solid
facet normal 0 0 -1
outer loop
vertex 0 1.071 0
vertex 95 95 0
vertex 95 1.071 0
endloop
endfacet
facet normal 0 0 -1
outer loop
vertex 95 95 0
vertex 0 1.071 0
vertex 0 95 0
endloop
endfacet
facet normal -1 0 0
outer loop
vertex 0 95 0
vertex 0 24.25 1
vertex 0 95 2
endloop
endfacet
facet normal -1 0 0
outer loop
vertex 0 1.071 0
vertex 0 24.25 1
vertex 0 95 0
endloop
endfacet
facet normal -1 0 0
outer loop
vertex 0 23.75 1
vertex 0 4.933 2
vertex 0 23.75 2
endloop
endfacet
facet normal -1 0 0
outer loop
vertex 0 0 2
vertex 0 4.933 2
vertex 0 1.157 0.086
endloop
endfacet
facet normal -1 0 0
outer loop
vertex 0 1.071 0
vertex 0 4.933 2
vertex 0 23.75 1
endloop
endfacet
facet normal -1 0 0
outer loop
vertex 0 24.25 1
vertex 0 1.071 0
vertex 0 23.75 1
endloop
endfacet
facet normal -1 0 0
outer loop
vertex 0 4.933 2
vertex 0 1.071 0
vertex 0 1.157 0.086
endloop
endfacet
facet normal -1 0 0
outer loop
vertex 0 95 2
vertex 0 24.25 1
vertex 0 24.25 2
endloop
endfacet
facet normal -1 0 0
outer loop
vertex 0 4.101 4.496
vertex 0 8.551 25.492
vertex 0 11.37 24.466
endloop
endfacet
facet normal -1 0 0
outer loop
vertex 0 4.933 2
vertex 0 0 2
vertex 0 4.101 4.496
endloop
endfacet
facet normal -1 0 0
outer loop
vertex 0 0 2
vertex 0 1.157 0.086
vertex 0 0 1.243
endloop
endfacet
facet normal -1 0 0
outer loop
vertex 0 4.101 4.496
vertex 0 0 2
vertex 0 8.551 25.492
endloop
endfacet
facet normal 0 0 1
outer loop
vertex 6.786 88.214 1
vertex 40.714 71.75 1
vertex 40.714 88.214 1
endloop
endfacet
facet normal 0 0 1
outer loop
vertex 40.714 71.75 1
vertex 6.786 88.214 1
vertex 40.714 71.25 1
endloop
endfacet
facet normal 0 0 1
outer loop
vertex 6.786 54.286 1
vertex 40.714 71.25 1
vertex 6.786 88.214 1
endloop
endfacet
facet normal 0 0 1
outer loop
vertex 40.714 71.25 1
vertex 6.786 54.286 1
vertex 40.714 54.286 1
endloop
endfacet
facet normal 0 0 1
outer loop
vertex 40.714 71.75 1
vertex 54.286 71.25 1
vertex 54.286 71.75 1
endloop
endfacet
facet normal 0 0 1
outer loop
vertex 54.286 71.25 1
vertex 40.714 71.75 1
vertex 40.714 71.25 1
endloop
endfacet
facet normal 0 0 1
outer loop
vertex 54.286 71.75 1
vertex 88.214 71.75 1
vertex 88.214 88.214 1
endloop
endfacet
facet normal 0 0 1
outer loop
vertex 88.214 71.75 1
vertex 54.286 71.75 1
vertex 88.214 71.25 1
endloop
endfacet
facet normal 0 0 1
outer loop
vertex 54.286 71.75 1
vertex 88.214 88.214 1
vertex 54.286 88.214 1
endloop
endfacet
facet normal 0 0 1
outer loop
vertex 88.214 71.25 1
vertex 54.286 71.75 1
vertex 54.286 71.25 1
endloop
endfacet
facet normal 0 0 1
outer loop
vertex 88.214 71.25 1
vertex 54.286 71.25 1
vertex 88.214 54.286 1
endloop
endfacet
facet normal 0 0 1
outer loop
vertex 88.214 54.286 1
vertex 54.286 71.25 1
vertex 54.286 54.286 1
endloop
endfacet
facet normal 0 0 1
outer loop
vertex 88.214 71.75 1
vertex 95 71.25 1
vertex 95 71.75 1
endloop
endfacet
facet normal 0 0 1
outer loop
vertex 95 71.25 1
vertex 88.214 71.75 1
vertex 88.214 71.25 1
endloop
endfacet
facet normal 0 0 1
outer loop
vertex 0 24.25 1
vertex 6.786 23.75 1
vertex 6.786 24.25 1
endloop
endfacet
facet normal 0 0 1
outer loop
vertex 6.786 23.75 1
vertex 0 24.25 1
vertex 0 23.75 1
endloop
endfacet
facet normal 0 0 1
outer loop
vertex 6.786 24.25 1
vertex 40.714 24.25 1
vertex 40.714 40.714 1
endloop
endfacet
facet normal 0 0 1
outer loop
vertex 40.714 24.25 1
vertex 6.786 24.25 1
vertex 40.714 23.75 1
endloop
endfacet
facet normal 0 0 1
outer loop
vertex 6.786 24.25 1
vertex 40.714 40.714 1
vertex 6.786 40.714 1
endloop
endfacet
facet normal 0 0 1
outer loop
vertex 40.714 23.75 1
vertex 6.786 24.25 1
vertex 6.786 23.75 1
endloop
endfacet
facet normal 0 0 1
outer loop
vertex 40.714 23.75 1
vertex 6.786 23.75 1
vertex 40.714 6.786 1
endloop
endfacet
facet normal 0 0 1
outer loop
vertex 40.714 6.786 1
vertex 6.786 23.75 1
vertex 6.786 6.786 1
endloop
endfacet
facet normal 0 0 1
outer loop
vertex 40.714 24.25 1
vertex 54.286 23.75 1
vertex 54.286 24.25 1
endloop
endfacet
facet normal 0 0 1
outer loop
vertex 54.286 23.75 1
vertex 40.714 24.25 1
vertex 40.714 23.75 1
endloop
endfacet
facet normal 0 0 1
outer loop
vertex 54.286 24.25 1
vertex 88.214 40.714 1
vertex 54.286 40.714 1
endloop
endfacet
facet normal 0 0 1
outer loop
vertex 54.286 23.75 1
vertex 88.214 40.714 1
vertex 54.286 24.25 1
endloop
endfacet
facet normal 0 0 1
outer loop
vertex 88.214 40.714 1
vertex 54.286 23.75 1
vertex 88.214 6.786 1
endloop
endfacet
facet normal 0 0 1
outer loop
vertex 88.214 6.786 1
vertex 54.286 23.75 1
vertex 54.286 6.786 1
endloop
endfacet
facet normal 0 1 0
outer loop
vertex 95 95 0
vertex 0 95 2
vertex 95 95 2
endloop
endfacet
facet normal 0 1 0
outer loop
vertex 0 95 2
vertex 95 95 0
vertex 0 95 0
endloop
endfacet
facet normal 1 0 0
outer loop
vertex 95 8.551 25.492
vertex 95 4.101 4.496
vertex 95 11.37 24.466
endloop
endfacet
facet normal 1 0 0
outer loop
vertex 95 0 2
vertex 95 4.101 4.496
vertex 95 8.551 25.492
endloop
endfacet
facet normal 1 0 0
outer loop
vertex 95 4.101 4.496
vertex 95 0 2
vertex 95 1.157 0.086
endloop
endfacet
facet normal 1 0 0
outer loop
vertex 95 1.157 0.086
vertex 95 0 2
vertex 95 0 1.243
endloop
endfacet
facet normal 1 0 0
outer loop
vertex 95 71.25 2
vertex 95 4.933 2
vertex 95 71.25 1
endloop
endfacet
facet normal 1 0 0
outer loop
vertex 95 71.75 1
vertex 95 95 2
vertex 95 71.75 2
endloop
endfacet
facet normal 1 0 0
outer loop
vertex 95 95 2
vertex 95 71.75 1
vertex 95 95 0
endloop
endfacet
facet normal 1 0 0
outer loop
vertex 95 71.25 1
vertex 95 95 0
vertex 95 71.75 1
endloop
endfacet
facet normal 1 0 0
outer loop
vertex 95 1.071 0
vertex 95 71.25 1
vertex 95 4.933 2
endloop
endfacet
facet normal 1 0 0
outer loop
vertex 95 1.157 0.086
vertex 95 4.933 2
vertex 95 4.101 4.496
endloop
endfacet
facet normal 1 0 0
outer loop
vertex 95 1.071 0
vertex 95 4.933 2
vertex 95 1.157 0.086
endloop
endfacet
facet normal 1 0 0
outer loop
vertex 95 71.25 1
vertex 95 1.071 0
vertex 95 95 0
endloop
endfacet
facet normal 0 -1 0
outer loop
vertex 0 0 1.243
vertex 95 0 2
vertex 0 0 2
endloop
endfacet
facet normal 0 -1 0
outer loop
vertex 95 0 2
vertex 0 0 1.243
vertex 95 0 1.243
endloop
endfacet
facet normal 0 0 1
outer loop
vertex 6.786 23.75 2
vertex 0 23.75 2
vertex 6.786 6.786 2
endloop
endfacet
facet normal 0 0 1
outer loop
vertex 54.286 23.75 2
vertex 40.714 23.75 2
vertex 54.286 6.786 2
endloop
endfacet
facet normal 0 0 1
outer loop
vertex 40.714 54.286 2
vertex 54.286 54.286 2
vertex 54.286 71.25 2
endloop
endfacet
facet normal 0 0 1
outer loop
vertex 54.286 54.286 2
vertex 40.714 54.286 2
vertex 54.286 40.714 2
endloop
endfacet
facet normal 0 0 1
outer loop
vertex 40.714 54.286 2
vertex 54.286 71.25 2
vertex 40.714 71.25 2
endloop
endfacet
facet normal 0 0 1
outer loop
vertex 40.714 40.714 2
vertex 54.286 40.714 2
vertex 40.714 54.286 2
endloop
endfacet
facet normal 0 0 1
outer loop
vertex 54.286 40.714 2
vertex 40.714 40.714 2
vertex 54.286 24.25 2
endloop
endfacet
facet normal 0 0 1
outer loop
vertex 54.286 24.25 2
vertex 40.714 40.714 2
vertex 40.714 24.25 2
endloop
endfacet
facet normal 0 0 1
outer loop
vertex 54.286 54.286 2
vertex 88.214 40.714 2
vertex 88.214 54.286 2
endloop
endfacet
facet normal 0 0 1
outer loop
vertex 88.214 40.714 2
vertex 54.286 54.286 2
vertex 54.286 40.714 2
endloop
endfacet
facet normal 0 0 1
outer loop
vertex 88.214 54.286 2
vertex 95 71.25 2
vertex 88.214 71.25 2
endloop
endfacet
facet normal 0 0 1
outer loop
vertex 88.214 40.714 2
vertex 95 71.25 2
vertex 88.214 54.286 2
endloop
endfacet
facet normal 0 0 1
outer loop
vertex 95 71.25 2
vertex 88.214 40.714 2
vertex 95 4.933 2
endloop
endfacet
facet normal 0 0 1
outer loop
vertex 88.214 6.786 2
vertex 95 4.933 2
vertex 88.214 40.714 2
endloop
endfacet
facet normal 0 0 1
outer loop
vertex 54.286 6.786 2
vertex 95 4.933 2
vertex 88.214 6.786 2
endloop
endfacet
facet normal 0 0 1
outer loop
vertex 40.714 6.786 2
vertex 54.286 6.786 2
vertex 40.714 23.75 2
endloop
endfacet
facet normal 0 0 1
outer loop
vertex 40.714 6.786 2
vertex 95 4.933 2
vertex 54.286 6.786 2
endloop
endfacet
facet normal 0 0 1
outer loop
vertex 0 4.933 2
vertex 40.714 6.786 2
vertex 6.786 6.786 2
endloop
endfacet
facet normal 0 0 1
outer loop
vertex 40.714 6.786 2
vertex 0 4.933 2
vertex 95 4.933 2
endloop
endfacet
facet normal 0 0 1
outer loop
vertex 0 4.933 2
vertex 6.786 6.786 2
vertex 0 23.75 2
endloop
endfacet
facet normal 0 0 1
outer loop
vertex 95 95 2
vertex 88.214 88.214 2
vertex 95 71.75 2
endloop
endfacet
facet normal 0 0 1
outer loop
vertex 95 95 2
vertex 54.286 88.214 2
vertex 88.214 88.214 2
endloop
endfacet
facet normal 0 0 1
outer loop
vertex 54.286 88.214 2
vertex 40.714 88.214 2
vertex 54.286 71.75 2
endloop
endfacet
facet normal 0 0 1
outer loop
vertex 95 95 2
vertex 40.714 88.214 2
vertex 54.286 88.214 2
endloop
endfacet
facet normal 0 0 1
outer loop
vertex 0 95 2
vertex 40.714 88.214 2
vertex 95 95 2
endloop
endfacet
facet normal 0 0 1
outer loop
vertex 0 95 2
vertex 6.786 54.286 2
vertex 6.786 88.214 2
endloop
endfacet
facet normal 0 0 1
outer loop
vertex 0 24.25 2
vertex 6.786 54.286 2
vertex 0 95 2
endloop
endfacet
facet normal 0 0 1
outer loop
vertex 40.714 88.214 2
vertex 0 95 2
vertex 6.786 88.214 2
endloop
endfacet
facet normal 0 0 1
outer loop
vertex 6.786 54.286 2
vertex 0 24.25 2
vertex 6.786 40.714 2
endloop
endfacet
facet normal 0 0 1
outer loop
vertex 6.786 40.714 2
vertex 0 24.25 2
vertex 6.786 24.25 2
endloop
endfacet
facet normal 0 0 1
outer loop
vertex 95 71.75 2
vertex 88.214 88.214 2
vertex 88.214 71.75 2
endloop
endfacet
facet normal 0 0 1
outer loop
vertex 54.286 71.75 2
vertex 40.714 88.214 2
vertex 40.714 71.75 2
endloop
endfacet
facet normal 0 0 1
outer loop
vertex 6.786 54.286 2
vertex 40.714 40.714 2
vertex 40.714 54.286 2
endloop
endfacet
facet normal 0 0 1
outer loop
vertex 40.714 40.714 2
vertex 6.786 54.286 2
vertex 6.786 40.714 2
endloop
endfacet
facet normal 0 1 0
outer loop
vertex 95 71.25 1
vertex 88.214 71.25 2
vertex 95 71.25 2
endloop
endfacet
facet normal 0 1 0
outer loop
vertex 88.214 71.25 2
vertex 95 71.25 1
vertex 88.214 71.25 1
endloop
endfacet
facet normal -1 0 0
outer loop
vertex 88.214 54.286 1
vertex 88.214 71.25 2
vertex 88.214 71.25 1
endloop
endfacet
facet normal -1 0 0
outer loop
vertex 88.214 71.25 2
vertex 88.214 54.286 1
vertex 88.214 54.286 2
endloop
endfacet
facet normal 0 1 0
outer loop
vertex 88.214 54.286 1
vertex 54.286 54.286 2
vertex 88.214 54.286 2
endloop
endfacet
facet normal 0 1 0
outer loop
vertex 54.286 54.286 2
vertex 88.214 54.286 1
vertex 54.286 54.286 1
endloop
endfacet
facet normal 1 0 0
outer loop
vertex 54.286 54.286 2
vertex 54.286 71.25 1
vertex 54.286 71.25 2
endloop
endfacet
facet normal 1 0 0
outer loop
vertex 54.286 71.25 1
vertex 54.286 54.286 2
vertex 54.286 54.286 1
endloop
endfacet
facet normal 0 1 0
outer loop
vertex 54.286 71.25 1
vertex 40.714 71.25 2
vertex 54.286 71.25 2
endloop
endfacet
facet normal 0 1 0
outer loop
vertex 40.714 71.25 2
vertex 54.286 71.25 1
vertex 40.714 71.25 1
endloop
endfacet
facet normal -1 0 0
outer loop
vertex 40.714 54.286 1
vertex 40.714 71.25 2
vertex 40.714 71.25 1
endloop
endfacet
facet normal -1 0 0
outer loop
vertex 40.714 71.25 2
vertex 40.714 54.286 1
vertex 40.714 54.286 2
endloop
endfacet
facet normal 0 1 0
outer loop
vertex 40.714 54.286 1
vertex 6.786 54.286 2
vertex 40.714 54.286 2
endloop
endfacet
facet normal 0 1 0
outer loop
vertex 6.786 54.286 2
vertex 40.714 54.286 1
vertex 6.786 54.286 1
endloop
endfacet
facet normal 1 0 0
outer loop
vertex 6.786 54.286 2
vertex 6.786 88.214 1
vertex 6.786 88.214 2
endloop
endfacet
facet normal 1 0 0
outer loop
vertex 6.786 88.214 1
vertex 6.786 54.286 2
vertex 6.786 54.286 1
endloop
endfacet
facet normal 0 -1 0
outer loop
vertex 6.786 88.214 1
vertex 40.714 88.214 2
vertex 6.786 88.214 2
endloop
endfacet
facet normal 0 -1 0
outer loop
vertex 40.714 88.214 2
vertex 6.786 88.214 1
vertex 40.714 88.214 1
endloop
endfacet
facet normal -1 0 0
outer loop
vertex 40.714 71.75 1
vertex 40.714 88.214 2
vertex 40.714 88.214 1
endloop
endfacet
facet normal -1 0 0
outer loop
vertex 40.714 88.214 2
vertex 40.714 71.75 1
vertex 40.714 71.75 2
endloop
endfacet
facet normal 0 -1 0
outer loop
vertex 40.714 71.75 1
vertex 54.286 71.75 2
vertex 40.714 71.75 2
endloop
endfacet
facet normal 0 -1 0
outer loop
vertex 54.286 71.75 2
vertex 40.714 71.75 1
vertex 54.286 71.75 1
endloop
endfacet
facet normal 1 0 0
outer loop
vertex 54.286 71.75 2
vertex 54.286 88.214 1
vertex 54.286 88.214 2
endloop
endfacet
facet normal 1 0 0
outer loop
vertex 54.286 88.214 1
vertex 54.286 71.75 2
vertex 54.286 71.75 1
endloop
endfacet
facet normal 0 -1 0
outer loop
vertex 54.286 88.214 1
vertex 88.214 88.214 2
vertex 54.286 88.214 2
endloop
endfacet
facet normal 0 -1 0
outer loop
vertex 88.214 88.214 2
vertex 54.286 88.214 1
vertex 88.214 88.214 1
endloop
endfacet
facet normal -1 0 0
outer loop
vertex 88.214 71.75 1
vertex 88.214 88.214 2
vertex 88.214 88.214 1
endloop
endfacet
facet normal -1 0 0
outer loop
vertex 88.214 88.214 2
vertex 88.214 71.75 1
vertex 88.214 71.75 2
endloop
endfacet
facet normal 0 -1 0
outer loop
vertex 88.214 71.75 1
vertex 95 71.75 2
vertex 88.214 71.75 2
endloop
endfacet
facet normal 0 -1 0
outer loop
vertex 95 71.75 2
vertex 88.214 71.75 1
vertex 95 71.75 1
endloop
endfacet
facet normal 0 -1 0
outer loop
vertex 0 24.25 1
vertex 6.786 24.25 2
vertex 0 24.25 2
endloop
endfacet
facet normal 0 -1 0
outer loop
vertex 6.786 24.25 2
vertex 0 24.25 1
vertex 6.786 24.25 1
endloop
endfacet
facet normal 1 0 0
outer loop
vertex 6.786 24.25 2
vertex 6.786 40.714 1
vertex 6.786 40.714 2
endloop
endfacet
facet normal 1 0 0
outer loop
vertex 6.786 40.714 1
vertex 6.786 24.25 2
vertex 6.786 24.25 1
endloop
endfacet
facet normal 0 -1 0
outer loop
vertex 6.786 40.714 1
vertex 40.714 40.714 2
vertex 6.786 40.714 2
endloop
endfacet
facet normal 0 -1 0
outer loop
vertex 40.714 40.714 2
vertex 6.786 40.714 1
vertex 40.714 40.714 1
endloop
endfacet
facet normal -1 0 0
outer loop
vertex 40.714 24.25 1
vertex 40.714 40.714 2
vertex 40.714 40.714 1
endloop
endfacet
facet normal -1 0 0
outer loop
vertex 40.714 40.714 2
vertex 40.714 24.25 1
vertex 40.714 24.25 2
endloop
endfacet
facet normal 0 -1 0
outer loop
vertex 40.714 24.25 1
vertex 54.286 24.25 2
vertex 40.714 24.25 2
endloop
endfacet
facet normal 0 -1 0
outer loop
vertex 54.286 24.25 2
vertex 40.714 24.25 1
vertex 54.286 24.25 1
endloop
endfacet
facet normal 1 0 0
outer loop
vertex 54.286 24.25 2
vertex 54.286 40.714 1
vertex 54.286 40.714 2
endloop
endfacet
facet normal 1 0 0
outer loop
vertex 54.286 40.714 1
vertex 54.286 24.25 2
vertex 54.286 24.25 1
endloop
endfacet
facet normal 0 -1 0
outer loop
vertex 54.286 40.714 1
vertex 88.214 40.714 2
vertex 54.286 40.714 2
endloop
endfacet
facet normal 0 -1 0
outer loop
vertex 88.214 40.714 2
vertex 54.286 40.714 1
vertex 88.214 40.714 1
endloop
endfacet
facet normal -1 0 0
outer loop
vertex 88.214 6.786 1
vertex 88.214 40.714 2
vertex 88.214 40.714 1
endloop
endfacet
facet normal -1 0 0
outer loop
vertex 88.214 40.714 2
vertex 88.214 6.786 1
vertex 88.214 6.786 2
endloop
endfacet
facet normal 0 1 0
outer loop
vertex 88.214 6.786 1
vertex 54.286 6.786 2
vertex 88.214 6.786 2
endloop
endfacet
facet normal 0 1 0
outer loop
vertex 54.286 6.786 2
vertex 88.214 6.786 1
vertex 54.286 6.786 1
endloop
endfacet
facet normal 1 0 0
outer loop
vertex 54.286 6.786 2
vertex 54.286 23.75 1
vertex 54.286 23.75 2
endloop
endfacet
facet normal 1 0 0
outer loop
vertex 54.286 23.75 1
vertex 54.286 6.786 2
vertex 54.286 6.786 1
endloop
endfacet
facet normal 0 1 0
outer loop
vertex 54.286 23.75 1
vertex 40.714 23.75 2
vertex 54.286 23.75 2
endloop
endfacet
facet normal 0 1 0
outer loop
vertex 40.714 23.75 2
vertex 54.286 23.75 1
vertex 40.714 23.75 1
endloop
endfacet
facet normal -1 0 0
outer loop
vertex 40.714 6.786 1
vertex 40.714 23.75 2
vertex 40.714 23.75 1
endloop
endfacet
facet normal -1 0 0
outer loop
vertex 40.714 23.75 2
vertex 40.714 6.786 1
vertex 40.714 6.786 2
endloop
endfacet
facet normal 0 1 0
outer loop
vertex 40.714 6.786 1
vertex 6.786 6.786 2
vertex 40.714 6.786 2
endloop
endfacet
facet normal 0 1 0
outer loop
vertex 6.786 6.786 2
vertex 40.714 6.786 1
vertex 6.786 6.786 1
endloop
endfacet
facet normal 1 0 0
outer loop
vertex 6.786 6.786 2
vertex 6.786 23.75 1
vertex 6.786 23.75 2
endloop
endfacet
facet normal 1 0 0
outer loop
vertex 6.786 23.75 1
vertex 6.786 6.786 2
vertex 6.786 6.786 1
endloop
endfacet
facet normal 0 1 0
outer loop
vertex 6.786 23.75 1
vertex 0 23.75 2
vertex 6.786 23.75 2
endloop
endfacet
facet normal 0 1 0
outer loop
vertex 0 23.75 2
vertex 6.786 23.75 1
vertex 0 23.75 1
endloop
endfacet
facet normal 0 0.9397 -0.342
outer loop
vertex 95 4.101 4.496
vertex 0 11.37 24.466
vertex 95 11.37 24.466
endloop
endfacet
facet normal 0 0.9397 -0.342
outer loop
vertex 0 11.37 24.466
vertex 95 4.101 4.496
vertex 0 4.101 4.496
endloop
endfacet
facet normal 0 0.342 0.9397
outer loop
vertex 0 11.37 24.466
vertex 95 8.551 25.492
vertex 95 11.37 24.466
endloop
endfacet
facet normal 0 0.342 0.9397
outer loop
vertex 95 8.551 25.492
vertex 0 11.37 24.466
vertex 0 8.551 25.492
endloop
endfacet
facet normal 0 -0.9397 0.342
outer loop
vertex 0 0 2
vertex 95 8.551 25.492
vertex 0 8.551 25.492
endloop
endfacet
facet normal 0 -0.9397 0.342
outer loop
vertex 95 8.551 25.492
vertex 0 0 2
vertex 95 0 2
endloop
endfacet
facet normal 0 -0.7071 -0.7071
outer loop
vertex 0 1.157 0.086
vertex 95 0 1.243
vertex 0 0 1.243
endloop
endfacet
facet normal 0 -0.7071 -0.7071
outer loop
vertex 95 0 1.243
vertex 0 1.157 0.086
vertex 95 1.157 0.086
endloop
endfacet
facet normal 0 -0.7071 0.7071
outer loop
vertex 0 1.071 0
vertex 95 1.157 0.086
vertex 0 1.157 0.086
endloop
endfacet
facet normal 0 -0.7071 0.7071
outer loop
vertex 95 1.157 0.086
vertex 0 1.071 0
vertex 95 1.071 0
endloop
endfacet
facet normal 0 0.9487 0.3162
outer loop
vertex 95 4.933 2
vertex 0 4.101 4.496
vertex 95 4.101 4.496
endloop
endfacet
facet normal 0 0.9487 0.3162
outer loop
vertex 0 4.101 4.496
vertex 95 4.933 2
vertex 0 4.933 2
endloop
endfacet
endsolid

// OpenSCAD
// 大枠サイズ
l= 95;
// 肉抜き穴サイズ
s=l/2.8;

difference(){
    union(){
        // 一応１枚板
        linear_extrude(1) square([l,l]);
        // 補強の骨
        translate([0,0,1]) linear_extrude(1){
            difference(){
                square([l,l]);
                // 肉抜き
                translate([((l/2)-s)/2,((l/2)-s)/2,0]) square([s,s]);
                translate([((l/2)-s)/2+l/2,((l/2)-s)/2,0]) square([s,s]);
                translate([((l/2)-s)/2,((l/2)-s)/2+l/2,0]) square([s,s]);
                translate([((l/2)-s)/2+l/2,((l/2)-s)/2+l/2,0]) square([s,s]);
                // 一筆書き工夫
                translate([0,(l/2)/2,0]) square([l/1.5,0.5]);
                translate([l-l/1.5,(l/2)+(l/4),0]) square([l/1.5,0.5]);
            }
        }
        translate([0,0,2]){
            rotate([-20,0,0]){
                hull(){
                    leg=25;
                    linear_extrude(leg) square([1,3]);
                    translate([l-1,0,0]) linear_extrude(leg) square([1,3]);
                }
            }
        }
    }
    color([0.8,0,0]) translate([0,-4.5,1.5]) rotate([-45,0,0]) linear_extrude(3) square([l,5]);
}

translate([0,4,1.8]){
    rotate([90,360,90]){
        linear_extrude(95)
        polygon([[1,0],[0,3],[-1,0]]);
    }
}
